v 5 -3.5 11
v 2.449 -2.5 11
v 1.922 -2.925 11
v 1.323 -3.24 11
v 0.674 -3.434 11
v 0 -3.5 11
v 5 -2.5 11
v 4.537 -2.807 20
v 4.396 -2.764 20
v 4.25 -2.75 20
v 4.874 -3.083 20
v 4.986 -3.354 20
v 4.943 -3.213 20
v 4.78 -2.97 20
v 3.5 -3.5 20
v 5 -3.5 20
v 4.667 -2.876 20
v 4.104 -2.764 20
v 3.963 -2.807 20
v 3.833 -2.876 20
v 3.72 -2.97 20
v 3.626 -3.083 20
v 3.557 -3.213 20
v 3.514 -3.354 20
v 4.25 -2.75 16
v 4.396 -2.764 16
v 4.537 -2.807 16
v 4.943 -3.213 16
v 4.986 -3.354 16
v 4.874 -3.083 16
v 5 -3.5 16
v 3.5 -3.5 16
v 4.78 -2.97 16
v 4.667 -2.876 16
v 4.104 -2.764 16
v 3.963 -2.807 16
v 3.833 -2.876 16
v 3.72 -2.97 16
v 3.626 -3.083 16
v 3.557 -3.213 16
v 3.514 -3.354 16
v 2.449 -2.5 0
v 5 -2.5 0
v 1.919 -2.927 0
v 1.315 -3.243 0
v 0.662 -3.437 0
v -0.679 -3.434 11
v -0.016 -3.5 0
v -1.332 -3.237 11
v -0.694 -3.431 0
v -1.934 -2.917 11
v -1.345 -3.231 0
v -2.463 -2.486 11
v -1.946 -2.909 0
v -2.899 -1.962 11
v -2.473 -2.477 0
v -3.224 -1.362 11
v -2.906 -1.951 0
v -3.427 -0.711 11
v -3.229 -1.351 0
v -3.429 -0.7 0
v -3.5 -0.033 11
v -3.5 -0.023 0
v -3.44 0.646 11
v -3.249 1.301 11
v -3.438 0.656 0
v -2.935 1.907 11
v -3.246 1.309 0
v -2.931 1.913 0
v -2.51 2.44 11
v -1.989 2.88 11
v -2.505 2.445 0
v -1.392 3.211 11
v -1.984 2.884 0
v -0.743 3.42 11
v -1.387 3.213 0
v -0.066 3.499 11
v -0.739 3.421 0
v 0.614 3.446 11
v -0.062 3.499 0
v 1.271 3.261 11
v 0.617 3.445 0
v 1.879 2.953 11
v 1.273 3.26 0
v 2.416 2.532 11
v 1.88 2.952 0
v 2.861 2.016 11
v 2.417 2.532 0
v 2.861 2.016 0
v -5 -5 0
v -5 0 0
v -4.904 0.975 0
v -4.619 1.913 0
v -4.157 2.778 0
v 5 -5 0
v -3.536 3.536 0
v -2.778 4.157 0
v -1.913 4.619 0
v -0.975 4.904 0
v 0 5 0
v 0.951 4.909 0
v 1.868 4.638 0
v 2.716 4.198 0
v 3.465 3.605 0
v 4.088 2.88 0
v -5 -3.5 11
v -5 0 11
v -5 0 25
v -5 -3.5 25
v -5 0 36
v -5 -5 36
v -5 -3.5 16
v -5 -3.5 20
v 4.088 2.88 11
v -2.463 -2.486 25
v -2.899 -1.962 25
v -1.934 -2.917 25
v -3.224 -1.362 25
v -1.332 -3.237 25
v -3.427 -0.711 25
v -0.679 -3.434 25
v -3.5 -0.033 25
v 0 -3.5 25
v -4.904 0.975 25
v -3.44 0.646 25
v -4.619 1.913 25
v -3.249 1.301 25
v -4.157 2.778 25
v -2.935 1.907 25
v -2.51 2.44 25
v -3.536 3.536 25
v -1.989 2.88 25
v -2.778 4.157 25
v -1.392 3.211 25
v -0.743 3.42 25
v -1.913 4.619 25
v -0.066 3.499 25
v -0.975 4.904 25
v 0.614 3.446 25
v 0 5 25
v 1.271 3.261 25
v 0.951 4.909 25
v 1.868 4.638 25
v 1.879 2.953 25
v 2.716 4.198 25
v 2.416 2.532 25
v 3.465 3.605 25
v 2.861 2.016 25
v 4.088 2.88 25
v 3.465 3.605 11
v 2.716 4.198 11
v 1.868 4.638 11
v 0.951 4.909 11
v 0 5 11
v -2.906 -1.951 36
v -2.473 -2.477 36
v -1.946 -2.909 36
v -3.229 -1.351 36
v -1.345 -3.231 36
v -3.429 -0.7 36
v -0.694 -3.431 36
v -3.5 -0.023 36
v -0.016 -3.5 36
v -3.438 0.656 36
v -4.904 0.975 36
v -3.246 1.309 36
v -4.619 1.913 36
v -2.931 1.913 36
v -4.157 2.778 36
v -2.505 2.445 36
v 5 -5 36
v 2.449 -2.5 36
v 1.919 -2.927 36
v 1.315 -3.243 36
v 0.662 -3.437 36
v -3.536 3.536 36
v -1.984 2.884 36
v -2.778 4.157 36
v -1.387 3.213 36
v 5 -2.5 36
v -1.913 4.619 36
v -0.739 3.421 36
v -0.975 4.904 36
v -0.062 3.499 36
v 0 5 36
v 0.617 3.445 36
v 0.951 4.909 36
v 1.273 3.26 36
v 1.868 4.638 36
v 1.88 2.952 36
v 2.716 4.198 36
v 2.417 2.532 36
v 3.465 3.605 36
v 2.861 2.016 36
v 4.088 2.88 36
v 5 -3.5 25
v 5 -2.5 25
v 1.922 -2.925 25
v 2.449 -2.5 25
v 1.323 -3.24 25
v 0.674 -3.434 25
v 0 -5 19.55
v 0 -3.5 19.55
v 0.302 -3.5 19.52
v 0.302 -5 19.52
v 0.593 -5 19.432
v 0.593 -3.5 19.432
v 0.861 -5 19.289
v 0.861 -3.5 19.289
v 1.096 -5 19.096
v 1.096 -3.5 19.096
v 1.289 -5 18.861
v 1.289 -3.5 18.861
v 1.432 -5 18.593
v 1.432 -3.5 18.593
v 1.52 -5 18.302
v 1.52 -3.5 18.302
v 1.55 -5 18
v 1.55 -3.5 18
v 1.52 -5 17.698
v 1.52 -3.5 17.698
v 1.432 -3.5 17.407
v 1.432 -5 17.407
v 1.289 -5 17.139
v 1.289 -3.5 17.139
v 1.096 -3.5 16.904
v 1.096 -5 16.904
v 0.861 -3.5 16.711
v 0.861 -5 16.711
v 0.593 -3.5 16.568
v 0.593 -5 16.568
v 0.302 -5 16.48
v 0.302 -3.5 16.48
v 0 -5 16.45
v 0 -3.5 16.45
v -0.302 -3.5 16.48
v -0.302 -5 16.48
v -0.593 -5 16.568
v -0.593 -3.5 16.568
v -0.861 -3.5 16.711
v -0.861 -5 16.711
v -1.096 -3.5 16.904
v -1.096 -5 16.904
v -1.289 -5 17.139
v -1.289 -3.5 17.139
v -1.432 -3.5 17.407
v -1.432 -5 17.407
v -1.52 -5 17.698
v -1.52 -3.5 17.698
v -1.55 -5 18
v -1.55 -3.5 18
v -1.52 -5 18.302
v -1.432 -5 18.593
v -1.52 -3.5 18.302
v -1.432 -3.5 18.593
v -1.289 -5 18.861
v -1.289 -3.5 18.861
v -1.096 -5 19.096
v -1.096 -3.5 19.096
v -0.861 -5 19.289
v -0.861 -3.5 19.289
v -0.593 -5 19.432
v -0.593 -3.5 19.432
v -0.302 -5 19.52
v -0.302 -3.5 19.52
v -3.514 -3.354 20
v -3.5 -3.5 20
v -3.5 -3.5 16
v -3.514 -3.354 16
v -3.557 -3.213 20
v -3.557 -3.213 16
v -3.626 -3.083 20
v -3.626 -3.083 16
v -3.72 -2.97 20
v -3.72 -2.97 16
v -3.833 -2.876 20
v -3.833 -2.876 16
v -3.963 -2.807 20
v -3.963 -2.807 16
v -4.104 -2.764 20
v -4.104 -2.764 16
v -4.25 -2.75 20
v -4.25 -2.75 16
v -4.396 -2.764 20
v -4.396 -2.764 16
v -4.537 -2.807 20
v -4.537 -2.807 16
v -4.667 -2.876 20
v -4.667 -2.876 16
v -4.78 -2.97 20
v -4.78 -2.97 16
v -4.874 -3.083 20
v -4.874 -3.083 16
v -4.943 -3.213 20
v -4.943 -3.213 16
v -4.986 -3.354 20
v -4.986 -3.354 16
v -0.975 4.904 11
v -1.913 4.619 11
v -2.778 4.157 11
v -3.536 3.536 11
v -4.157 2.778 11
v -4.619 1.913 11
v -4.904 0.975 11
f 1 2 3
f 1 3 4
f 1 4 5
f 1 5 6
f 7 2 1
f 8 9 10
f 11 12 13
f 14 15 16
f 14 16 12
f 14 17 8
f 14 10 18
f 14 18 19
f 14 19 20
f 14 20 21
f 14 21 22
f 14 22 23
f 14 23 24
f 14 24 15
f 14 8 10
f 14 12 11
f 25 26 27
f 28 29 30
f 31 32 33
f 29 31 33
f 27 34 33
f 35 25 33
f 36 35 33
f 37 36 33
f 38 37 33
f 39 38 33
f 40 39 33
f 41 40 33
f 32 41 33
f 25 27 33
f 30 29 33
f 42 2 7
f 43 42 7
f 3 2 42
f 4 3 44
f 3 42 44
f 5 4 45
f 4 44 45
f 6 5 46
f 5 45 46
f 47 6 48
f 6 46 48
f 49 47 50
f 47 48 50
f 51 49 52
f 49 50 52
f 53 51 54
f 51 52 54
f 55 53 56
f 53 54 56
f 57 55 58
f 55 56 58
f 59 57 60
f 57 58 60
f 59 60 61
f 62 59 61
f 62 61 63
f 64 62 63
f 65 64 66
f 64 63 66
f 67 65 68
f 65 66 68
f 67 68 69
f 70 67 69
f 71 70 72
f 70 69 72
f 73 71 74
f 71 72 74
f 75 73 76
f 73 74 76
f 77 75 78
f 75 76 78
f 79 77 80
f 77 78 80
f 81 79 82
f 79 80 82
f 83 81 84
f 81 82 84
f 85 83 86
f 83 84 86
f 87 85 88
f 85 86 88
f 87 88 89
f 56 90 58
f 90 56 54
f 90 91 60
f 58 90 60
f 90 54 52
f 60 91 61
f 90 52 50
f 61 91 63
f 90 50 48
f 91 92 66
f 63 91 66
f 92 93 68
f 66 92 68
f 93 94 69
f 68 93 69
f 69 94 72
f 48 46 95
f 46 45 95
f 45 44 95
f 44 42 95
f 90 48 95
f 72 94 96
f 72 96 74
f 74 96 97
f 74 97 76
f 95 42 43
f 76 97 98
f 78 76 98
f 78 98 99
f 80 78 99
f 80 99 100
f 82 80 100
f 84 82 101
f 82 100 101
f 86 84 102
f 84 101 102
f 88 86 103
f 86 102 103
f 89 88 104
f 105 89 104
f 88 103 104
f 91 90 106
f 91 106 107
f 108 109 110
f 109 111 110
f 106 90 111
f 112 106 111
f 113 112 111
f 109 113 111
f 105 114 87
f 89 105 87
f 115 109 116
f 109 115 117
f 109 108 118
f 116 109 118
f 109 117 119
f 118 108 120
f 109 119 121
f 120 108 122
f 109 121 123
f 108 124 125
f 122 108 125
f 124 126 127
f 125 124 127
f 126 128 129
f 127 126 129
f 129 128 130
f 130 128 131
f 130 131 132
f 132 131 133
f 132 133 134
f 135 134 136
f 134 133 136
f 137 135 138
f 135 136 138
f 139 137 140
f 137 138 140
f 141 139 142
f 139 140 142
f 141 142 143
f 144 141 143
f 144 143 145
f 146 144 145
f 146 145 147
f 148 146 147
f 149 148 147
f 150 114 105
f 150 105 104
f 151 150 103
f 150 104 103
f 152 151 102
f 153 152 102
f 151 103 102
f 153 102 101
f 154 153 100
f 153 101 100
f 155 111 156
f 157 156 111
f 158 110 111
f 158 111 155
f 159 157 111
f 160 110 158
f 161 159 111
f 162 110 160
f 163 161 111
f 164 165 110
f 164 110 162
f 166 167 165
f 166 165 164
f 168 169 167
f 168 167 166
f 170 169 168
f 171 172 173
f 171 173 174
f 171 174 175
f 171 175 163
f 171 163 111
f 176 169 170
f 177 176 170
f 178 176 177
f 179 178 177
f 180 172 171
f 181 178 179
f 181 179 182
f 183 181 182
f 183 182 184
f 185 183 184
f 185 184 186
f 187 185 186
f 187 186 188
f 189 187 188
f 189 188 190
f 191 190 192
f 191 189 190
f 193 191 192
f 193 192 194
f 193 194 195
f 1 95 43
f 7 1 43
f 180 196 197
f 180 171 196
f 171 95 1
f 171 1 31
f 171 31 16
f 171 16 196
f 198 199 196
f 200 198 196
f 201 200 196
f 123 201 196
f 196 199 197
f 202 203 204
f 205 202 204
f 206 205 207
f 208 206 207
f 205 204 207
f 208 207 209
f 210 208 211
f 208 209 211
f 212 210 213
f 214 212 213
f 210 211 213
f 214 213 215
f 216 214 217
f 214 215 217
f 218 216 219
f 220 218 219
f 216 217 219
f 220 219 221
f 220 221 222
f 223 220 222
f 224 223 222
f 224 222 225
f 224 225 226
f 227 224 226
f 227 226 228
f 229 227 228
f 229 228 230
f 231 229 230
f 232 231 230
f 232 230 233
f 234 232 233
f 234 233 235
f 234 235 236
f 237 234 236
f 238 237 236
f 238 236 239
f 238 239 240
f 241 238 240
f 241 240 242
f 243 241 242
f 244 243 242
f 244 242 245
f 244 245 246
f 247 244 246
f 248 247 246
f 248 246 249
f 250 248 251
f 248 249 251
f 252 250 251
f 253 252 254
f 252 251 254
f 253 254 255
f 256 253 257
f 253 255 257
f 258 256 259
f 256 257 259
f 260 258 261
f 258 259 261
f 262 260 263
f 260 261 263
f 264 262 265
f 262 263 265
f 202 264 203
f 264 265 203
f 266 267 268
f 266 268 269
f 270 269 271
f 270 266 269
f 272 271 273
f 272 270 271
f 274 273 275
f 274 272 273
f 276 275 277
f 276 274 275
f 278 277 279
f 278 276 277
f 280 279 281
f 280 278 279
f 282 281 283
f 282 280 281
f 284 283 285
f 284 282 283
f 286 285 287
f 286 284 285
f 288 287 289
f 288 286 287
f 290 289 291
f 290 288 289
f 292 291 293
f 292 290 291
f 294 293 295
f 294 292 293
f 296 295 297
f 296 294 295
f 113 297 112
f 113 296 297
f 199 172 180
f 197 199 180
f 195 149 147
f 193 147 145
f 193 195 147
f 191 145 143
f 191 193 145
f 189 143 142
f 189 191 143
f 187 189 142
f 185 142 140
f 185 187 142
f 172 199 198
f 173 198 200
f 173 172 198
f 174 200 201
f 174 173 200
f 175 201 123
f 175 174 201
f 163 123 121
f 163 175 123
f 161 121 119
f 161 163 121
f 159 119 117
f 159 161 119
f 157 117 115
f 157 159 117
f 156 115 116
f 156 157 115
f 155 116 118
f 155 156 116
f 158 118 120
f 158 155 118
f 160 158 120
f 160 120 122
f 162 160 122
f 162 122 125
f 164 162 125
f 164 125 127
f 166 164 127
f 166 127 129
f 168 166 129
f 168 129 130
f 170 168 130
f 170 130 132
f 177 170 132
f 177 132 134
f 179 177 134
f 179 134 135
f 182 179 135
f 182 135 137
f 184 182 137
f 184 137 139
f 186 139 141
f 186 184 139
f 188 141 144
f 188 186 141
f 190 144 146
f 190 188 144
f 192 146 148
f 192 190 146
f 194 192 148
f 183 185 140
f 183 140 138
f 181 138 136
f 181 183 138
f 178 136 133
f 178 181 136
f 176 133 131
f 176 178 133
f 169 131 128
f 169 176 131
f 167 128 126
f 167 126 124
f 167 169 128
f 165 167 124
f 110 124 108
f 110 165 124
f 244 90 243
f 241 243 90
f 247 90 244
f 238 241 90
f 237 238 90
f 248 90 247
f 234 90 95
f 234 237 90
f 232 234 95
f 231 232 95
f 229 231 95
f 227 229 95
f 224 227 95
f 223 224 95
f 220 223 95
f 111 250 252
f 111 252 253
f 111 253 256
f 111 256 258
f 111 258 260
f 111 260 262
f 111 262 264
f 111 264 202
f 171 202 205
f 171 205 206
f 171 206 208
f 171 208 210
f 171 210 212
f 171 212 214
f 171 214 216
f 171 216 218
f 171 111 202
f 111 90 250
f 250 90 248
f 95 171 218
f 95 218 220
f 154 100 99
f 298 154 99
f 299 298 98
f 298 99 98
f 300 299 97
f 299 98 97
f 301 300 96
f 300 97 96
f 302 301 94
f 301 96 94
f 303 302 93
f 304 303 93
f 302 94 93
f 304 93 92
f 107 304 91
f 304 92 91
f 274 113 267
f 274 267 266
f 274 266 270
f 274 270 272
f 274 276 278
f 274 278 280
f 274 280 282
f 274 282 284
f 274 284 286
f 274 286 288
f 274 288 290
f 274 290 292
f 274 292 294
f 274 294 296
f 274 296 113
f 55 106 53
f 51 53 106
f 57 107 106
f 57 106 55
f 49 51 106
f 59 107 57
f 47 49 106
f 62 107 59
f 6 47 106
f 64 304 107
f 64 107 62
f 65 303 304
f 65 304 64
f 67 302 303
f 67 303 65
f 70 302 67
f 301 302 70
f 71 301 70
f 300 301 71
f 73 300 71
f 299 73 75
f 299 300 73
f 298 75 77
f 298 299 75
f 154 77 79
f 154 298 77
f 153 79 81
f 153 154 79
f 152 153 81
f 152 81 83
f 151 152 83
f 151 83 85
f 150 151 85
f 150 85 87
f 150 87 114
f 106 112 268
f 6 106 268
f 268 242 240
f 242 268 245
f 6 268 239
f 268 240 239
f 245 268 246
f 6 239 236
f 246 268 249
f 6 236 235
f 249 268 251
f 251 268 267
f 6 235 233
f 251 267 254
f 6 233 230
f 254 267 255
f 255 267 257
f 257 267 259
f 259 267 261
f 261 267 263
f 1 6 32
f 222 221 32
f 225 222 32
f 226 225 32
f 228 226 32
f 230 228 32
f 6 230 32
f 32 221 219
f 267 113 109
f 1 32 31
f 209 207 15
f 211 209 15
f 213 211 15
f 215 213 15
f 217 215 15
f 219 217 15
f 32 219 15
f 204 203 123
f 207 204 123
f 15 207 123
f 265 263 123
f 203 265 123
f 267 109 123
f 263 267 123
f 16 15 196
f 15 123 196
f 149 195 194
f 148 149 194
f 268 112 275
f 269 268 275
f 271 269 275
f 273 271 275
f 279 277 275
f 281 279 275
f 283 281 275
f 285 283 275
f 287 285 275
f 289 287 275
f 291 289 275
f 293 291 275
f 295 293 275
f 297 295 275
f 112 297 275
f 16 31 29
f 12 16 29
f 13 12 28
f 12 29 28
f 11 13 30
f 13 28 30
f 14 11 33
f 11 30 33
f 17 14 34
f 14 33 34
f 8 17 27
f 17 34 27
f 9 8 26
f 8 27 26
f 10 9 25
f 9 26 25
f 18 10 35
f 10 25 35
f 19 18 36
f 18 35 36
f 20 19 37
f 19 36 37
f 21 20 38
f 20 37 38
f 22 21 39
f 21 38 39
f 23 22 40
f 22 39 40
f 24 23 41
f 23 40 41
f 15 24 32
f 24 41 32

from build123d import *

# Parameters (mm, degrees)
RESSALTO_EXTRUS_O1_DEPTH = 11
ESBO_O2_W                = 10
ESBO_O2_H                = 1.5
RESSALTO_EXTRUS_O2_DEPTH = 7
RESSALTO_EXTRUS_O3_DEPTH = 2
ESBO_O4_R                = 1.55
CORTE_EXTRUS_O1_DEPTH    = 2
CORTE_EXTRUS_O2_DEPTH    = 37.687872656


with BuildPart() as part:
    # Esboço1 → Ressalto-extrusão1 (new body)
    with BuildSketch(Plane.XY):
        with BuildLine():
            Line((-5, -5), (0, -5))
            ThreePointArc((0, -5), (-3.535533906, -3.535533906), (-5, 0))
            Line((-5, 0), (-5, -5))
        make_face()
        with BuildLine():
            Line((5, -5), (5, 0))
            ThreePointArc((5, 0), (3.535533906, -3.535533906), (0, -5))
            Line((0, -5), (5, -5))
        make_face()
        with BuildLine():
            ThreePointArc((-3.5, 0), (0, 3.5), (3.5, 0))
            Line((3.5, 0), (5, 0))
            ThreePointArc((5, 0), (3.535533906, 3.535533905), (1e-09, 5))
            ThreePointArc((1e-09, 5), (-3.535533905, 3.535533906), (-5, 0))
            Line((-5, 0), (-3.5, 0))
        make_face()
        with BuildLine():
            Line((5, 0), (3.5, 0))
            ThreePointArc((3.5, 0), (0, -3.5), (-3.5, 0))
            Line((-3.5, 0), (-5, 0))
            ThreePointArc((-5, 0), (-3.535533906, -3.535533906), (0, -5))
            ThreePointArc((0, -5), (3.535533906, -3.535533906), (5, 0))
        make_face()
    ressalto_extrus_o1 = extrude(amount=RESSALTO_EXTRUS_O1_DEPTH)

    # Esboço2 → Ressalto-extrusão2 (add)
    with BuildSketch(Plane.XY.offset(11)):
        with Locations((0, -4.25)):
            Rectangle(ESBO_O2_W, ESBO_O2_H)
    ressalto_extrus_o2 = extrude(amount=RESSALTO_EXTRUS_O2_DEPTH)

    # Esboço3 → Ressalto-extrusão3 (add)
    with BuildSketch(Plane.XY.offset(18)):
        with BuildLine():
            Line((3.5, -3.5), (5, -3.5))
            ThreePointArc((5, -3.5), (4.25, -2.75), (3.5, -3.5))
        make_face()
        with BuildLine():
            Line((-5, -3.5), (-3.5, -3.5))
            ThreePointArc((-3.5, -3.5), (-4.25, -2.75), (-5, -3.5))
        make_face()
    ressalto_extrus_o3 = extrude(amount=-RESSALTO_EXTRUS_O3_DEPTH)

    # Espelhar1: Ressalto-extrusão1, Ressalto-extrusão2, Ressalto-extrusão3 across plane
    add(ressalto_extrus_o1.mirror(Plane(origin=(0, 0, 18), x_dir=(1, 0, 0), z_dir=(0, 0, -1))))
    add(ressalto_extrus_o2.mirror(Plane(origin=(0, 0, 18), x_dir=(1, 0, 0), z_dir=(0, 0, -1))))
    add(ressalto_extrus_o3.mirror(Plane(origin=(0, 0, 18), x_dir=(1, 0, 0), z_dir=(0, 0, -1))))

    # Esboço4 → Corte-extrusão1 (cut)
    with BuildSketch(Plane(origin=(0, -3.5, 0), x_dir=(1, 0, 0), z_dir=(0, 1, 0))):
        with Locations(Location((0, -18, 0), (0, 0, 270))):
            Circle(ESBO_O4_R)
    extrude(amount=-CORTE_EXTRUS_O1_DEPTH, mode=Mode.SUBTRACT)

    # Esboço5 → Corte-extrusão2 (cut, through all)
    with BuildSketch(Plane.XY.offset(36)):
        with BuildLine():
            Line((2.449489743, -2.5), (5, -2.5))
            Line((5, -2.5), (5, 0))
            ThreePointArc((5, 0), (4.766431527, 1.510341187), (4.087547799, 2.87957514))
            Line((4.087547799, 2.87957514), (2.861283459, 2.015702598))
            ThreePointArc((2.861283459, 2.015702598), (3.336502069, 1.057238831), (3.5, 0))
            ThreePointArc((3.5, 0), (3.226702194, -1.355873501), (2.449489743, -2.5))
        make_face()
    extrude(amount=-CORTE_EXTRUS_O2_DEPTH, mode=Mode.SUBTRACT)


solid = part.part
